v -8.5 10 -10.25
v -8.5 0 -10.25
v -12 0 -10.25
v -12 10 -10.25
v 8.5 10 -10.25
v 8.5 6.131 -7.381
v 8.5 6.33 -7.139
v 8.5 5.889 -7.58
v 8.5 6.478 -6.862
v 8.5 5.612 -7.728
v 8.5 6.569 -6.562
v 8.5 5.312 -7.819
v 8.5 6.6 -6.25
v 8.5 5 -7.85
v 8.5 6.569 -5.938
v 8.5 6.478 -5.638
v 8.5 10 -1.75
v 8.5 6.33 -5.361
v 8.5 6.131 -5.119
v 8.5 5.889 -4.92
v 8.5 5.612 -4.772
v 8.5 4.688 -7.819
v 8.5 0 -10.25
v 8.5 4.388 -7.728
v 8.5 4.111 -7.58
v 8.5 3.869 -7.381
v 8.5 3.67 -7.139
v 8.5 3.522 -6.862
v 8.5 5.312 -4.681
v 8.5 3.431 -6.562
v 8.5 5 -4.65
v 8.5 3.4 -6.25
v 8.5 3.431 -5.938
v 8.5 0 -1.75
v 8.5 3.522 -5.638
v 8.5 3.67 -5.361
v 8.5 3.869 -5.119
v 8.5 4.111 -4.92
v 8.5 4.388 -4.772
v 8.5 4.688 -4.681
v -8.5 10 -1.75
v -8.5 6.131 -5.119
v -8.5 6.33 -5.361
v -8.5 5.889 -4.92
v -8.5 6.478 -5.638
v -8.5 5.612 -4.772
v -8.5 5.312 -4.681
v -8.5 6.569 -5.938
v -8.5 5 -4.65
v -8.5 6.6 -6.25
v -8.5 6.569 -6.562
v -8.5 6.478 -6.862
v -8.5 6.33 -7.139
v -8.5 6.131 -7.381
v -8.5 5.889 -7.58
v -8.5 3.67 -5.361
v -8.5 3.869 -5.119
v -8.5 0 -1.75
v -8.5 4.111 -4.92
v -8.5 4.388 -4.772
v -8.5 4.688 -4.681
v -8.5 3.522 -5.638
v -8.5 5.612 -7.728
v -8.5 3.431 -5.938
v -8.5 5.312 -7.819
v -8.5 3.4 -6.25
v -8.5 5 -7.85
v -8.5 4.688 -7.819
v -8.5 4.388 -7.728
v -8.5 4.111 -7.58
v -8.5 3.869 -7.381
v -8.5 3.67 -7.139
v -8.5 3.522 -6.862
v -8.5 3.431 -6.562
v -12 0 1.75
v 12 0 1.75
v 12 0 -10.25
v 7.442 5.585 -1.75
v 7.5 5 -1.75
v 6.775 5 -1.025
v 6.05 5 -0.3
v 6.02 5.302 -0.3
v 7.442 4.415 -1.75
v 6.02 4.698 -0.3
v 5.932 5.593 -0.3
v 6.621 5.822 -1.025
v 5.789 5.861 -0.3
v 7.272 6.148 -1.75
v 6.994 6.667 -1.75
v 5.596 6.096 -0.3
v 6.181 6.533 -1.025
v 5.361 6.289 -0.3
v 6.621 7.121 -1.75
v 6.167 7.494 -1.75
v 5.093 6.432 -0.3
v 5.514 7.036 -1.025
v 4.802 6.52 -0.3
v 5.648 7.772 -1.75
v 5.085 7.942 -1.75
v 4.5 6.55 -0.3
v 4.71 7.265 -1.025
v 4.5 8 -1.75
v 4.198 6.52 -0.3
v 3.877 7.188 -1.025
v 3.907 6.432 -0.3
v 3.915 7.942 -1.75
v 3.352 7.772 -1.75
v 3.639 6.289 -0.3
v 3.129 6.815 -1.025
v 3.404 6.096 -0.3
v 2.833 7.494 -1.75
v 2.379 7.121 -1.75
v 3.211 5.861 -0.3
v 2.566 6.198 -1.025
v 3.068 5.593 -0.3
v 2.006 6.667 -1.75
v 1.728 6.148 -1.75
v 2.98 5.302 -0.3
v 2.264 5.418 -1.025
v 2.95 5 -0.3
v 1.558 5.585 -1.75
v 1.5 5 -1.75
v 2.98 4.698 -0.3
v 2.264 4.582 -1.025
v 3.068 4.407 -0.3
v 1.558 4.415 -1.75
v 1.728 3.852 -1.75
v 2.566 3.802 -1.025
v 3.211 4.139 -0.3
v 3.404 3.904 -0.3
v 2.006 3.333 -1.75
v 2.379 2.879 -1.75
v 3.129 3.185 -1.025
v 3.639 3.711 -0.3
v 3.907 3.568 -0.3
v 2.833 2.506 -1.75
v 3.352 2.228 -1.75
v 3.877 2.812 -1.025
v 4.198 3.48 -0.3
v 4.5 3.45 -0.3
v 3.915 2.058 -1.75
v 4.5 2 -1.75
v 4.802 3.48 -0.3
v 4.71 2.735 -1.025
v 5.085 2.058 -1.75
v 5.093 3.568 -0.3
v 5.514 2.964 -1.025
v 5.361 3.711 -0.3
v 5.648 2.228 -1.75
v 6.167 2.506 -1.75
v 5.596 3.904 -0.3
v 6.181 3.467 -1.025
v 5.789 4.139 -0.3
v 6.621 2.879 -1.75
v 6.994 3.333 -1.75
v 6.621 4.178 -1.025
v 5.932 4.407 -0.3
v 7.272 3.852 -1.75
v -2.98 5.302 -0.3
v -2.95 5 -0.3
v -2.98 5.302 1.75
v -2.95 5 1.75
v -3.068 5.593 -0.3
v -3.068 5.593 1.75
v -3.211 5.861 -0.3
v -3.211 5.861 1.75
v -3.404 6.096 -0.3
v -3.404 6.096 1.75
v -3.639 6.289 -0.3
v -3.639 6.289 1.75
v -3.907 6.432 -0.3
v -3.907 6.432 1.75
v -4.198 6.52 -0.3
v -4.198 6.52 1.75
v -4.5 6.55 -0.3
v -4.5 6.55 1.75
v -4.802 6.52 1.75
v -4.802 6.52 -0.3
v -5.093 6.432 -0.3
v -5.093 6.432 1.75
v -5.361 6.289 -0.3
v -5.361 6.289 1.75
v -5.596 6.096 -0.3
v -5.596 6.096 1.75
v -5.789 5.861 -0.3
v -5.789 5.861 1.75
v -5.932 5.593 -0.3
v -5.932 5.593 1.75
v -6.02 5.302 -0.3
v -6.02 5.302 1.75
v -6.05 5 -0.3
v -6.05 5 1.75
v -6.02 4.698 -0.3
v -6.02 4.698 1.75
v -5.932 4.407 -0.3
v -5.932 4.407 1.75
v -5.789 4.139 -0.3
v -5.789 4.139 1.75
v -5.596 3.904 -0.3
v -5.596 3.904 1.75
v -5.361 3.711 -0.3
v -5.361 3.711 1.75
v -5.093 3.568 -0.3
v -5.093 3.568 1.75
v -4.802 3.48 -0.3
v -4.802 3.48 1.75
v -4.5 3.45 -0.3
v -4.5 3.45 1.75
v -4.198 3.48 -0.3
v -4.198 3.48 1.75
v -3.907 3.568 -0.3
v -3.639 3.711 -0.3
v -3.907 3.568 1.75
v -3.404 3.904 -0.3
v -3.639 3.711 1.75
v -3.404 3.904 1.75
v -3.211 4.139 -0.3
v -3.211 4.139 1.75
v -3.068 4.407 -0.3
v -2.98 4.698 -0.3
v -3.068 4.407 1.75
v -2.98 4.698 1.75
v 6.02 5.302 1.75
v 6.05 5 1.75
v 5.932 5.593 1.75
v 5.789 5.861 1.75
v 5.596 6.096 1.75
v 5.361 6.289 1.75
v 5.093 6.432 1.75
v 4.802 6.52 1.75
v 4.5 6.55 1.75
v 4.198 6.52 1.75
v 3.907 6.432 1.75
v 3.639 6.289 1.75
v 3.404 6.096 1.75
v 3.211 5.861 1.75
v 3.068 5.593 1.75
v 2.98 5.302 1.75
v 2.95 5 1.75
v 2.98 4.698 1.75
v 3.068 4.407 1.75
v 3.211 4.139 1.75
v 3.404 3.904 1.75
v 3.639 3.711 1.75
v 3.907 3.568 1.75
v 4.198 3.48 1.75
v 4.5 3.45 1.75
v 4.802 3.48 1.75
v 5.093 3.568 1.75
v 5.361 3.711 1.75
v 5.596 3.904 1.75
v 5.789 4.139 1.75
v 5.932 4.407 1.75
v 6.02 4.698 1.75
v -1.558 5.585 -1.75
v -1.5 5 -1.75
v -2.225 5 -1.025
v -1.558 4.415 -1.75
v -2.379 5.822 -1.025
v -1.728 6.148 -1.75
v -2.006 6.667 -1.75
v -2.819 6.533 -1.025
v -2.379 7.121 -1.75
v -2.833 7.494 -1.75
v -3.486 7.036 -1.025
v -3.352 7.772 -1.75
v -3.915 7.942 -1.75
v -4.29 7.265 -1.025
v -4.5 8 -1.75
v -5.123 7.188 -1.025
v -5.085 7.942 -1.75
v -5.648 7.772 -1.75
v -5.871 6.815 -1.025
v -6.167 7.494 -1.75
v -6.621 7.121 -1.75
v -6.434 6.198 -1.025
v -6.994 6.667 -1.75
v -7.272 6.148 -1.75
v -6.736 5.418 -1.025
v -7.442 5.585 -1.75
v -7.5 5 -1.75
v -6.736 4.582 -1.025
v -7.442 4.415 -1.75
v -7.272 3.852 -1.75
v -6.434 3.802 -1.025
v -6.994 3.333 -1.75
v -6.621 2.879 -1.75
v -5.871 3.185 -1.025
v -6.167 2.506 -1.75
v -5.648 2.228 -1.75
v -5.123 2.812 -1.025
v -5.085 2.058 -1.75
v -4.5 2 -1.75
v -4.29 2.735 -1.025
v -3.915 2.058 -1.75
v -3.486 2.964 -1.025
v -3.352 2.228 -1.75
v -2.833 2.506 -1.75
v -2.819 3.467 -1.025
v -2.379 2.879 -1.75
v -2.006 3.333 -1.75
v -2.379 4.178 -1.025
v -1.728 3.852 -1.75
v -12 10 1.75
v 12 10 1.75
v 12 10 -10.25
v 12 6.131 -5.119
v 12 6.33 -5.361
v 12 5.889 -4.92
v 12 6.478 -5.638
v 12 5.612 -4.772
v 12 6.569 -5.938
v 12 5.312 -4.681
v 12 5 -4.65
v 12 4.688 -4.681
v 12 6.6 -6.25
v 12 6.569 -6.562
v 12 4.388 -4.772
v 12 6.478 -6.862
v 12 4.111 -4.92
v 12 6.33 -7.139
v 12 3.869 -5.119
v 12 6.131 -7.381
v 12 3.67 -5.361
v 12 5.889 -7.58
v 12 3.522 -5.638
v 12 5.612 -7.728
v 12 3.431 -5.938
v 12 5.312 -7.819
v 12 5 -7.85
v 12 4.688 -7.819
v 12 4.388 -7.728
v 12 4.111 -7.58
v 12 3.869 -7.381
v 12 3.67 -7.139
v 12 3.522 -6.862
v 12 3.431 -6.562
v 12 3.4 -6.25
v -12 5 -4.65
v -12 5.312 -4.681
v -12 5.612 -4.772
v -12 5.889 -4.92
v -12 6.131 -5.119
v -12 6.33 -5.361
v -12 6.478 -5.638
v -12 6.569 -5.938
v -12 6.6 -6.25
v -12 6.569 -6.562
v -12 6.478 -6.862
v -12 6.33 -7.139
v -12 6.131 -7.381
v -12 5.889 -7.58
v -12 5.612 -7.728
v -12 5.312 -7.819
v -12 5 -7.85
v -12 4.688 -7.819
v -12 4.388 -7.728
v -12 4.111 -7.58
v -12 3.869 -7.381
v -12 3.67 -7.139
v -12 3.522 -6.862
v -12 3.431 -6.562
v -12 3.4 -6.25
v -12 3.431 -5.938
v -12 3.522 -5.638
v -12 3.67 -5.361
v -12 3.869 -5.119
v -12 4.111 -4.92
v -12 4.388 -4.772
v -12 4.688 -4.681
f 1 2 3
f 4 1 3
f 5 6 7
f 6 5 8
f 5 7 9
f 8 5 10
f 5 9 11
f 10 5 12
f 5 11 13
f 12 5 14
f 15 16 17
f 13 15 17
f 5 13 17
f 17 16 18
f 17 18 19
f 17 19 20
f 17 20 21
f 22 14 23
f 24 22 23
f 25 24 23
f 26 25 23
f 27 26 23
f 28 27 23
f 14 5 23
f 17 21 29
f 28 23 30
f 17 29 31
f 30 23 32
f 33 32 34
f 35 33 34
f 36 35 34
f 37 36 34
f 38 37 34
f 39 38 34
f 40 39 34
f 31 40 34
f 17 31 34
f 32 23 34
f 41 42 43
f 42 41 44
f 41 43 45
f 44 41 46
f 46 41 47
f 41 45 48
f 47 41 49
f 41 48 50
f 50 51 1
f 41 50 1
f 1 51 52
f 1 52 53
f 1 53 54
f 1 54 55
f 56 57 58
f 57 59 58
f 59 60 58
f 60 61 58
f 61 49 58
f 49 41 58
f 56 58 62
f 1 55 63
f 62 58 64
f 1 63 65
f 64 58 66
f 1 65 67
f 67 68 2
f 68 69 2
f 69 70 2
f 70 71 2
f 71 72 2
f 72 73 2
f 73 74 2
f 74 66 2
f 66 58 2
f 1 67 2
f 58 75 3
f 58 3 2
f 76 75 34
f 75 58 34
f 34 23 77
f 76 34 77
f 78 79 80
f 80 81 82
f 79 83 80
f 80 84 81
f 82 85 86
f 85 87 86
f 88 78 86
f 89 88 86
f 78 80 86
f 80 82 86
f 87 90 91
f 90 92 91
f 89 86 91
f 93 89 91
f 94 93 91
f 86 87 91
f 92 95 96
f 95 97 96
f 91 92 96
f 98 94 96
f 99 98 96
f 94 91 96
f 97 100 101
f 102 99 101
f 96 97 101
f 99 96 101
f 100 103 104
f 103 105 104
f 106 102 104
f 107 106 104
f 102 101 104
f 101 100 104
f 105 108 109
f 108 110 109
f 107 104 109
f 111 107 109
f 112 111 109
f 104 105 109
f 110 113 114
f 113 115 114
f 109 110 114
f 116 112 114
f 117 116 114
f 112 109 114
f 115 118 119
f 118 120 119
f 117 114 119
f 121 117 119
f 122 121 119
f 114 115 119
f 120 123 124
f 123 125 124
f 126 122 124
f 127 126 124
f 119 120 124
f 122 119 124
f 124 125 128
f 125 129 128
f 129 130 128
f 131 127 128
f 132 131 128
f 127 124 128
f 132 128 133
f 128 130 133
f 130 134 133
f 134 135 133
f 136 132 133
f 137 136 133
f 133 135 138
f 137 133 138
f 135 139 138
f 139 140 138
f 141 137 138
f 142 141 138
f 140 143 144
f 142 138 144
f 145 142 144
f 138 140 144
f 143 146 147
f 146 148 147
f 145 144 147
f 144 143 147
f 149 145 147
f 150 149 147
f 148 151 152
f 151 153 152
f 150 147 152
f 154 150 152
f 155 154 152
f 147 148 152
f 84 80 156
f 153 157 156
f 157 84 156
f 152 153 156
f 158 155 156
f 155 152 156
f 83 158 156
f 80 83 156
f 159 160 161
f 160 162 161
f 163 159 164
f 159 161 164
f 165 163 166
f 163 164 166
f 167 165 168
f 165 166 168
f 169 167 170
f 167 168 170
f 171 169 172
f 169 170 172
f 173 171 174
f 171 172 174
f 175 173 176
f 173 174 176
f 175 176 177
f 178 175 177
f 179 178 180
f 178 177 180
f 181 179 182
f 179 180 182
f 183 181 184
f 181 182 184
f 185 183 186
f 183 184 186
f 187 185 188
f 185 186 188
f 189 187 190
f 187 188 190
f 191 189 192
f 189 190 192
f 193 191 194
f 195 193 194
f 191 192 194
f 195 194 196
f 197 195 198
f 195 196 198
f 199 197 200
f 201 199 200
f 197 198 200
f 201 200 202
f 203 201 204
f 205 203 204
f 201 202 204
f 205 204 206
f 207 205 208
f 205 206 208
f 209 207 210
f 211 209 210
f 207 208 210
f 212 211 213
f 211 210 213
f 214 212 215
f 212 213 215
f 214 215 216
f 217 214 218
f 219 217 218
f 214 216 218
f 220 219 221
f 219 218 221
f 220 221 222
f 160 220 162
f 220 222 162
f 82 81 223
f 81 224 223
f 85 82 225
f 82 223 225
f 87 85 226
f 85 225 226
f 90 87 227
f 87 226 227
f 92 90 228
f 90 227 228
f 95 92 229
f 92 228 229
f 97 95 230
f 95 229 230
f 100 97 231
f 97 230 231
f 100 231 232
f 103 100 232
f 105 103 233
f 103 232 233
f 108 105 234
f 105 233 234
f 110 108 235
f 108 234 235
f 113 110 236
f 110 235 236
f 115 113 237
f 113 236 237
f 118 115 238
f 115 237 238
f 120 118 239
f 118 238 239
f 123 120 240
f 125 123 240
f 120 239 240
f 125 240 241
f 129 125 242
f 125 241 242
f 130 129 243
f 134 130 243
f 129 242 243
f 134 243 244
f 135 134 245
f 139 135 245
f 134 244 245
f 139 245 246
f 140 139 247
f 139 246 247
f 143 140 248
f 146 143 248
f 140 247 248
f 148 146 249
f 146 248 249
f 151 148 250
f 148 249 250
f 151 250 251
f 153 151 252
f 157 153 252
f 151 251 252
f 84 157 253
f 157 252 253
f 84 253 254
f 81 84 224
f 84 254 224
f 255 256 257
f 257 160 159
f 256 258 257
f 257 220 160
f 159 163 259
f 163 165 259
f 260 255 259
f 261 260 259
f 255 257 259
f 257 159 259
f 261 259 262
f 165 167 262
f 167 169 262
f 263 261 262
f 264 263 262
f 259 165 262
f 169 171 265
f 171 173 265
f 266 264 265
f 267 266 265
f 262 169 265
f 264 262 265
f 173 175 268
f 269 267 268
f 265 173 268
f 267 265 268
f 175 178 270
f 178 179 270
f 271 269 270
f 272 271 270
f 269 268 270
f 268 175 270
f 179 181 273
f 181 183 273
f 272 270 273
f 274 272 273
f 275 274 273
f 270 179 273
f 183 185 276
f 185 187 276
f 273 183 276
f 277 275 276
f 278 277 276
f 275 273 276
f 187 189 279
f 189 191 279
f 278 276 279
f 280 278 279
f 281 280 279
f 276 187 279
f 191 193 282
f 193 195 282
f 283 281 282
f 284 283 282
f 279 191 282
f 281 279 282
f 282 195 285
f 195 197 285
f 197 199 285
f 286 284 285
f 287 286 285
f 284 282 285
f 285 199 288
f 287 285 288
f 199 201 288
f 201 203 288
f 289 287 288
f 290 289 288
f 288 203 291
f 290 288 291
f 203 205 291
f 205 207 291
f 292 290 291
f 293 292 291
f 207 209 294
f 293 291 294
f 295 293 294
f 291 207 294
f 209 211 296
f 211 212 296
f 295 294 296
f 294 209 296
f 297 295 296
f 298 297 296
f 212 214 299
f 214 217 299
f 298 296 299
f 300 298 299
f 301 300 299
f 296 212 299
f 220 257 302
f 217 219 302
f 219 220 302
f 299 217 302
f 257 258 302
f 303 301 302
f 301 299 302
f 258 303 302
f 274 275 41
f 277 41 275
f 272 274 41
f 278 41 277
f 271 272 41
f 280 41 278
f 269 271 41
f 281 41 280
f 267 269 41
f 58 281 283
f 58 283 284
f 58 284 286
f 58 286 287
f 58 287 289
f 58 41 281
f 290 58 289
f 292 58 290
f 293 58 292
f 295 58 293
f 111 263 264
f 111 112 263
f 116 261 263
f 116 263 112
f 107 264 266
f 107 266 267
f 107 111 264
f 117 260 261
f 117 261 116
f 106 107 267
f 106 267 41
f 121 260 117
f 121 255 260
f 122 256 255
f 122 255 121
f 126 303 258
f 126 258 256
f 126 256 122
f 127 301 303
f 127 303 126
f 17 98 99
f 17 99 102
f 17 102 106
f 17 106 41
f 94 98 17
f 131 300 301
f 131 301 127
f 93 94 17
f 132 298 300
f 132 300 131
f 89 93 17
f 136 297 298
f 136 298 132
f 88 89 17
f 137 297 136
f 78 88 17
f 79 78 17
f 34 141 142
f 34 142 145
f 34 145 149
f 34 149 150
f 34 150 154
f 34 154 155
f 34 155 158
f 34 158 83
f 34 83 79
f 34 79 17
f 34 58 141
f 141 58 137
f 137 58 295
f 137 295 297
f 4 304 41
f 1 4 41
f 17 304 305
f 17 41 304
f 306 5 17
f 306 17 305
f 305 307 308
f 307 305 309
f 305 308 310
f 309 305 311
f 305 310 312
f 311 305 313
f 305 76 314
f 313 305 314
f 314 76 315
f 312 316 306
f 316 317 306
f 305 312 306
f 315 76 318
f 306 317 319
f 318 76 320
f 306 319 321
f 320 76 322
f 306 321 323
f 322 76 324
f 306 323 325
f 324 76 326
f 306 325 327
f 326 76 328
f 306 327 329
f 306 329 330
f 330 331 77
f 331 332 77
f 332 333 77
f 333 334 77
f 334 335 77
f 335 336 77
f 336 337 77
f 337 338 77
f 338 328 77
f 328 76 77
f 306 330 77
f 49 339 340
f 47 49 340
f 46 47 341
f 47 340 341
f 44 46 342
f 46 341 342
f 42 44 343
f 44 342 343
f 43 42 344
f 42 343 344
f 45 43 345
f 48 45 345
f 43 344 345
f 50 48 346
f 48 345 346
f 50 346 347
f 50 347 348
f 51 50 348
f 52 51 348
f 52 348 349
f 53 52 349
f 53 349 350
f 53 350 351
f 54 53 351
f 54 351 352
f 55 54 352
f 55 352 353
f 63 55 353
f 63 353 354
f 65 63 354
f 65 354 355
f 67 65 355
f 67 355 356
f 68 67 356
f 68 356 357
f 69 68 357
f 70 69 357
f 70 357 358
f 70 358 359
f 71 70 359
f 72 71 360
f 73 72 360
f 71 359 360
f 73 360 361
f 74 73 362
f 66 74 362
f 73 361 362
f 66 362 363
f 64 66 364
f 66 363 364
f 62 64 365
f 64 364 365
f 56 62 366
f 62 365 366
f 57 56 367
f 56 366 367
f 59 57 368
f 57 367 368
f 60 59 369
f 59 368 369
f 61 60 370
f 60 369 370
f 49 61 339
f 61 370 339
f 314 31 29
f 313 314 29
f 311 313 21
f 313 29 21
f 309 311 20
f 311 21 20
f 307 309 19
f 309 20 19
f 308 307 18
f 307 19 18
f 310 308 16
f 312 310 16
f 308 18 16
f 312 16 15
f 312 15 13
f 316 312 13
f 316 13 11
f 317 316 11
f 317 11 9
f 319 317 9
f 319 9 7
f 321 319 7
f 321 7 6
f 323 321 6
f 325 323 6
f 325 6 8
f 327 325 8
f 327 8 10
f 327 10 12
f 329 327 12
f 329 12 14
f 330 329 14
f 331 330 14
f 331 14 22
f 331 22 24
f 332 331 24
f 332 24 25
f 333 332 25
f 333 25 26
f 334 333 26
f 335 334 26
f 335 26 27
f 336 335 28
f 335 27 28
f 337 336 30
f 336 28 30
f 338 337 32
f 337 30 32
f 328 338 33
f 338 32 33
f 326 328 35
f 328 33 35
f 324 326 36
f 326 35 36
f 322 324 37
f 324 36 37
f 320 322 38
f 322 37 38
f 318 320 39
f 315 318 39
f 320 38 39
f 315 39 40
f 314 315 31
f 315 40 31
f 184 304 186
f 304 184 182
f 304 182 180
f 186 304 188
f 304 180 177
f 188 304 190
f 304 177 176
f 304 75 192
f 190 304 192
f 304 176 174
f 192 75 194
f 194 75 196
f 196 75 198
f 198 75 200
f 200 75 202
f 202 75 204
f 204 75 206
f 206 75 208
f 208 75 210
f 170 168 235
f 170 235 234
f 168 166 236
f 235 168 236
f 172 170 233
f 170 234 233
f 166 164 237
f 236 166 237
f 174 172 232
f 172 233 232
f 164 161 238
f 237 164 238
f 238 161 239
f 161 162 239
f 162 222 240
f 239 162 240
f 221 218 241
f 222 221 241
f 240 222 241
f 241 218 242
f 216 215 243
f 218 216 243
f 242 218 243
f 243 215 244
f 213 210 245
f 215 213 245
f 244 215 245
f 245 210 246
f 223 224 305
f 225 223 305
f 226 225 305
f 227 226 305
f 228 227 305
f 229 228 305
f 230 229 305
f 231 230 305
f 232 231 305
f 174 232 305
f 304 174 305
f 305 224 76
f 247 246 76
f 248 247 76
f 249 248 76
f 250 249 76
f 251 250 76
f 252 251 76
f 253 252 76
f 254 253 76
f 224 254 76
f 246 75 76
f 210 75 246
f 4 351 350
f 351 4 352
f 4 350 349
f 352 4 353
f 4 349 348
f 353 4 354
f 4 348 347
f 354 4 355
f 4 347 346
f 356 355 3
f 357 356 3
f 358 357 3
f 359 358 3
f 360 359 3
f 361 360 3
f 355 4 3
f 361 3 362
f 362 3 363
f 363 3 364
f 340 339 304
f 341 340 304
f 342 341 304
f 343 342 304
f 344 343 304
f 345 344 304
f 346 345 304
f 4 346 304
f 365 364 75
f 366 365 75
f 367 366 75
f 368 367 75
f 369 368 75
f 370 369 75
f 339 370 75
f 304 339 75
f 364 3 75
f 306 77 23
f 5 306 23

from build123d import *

# Parameters (mm, degrees)
SKETCH1_W                                           = 17
SKETCH1_H                                           = 3.5
BOSS_EXTRUDE1_DEPTH                                 = 10
SKETCH2_R                                           = 1.6
CUT_EXTRUDE1_DEPTH                                  = 25
SKETCH3_R                                           = 1.5
CUT_EXTRUDE2_DEPTH                                  = 4.5
CSK_FOR_M4_COUNTERSUNK_FLAT_HEAD_SCREW1_D           = 3.1
CSK_FOR_M4_COUNTERSUNK_FLAT_HEAD_SCREW1_CSINK_D     = 6
CSK_FOR_M4_COUNTERSUNK_FLAT_HEAD_SCREW1_CSINK_ANGLE = 90


with BuildPart() as part:
    # Sketch1 → Boss-Extrude1 (new body)
    with BuildSketch(Plane(origin=(0, 0, 0), x_dir=(1, 0, 0), z_dir=(0, 1, 0))):
        Polygon((-12, -1.75), (-8.5, -1.75), (-8.5, 1.75), (-8.5, 10.25), (-12, 10.25), align=None)
        Rectangle(SKETCH1_W, SKETCH1_H)
        Polygon((8.5, 1.75), (8.5, -1.75), (12, -1.75), (12, 10.25), (8.5, 10.25), align=None)
    extrude(amount=BOSS_EXTRUDE1_DEPTH)

    # Sketch2 → Cut-Extrude1 (cut, through all)
    with BuildSketch(Plane.ZY.offset(12)):
        with Locations((-6.25, 5)):
            Circle(SKETCH2_R)
    extrude(amount=-CUT_EXTRUDE1_DEPTH, mode=Mode.SUBTRACT)

    # Sketch3 → Cut-Extrude2 (cut, through all)
    with BuildSketch(Plane(origin=(0, 0, -1.75), x_dir=(-1, 0, 0), z_dir=(0, 0, -1))):
        with Locations((-4.5, 5)):
            Circle(SKETCH3_R)
        with Locations((4.5, 5)):
            Circle(SKETCH3_R)
    extrude(amount=-CUT_EXTRUDE2_DEPTH, mode=Mode.SUBTRACT)

    # CSK for M4 Countersunk Flat Head Screw1 (through all)
    with Locations(Plane(origin=(4.5, 5, -1.75), x_dir=(-1, 0, 0), z_dir=(0, 0, -1))):
        with Locations((0, 0), (9, 0)):
            CounterSinkHole(CSK_FOR_M4_COUNTERSUNK_FLAT_HEAD_SCREW1_D / 2, CSK_FOR_M4_COUNTERSUNK_FLAT_HEAD_SCREW1_CSINK_D / 2, counter_sink_angle=CSK_FOR_M4_COUNTERSUNK_FLAT_HEAD_SCREW1_CSINK_ANGLE)


solid = part.part
